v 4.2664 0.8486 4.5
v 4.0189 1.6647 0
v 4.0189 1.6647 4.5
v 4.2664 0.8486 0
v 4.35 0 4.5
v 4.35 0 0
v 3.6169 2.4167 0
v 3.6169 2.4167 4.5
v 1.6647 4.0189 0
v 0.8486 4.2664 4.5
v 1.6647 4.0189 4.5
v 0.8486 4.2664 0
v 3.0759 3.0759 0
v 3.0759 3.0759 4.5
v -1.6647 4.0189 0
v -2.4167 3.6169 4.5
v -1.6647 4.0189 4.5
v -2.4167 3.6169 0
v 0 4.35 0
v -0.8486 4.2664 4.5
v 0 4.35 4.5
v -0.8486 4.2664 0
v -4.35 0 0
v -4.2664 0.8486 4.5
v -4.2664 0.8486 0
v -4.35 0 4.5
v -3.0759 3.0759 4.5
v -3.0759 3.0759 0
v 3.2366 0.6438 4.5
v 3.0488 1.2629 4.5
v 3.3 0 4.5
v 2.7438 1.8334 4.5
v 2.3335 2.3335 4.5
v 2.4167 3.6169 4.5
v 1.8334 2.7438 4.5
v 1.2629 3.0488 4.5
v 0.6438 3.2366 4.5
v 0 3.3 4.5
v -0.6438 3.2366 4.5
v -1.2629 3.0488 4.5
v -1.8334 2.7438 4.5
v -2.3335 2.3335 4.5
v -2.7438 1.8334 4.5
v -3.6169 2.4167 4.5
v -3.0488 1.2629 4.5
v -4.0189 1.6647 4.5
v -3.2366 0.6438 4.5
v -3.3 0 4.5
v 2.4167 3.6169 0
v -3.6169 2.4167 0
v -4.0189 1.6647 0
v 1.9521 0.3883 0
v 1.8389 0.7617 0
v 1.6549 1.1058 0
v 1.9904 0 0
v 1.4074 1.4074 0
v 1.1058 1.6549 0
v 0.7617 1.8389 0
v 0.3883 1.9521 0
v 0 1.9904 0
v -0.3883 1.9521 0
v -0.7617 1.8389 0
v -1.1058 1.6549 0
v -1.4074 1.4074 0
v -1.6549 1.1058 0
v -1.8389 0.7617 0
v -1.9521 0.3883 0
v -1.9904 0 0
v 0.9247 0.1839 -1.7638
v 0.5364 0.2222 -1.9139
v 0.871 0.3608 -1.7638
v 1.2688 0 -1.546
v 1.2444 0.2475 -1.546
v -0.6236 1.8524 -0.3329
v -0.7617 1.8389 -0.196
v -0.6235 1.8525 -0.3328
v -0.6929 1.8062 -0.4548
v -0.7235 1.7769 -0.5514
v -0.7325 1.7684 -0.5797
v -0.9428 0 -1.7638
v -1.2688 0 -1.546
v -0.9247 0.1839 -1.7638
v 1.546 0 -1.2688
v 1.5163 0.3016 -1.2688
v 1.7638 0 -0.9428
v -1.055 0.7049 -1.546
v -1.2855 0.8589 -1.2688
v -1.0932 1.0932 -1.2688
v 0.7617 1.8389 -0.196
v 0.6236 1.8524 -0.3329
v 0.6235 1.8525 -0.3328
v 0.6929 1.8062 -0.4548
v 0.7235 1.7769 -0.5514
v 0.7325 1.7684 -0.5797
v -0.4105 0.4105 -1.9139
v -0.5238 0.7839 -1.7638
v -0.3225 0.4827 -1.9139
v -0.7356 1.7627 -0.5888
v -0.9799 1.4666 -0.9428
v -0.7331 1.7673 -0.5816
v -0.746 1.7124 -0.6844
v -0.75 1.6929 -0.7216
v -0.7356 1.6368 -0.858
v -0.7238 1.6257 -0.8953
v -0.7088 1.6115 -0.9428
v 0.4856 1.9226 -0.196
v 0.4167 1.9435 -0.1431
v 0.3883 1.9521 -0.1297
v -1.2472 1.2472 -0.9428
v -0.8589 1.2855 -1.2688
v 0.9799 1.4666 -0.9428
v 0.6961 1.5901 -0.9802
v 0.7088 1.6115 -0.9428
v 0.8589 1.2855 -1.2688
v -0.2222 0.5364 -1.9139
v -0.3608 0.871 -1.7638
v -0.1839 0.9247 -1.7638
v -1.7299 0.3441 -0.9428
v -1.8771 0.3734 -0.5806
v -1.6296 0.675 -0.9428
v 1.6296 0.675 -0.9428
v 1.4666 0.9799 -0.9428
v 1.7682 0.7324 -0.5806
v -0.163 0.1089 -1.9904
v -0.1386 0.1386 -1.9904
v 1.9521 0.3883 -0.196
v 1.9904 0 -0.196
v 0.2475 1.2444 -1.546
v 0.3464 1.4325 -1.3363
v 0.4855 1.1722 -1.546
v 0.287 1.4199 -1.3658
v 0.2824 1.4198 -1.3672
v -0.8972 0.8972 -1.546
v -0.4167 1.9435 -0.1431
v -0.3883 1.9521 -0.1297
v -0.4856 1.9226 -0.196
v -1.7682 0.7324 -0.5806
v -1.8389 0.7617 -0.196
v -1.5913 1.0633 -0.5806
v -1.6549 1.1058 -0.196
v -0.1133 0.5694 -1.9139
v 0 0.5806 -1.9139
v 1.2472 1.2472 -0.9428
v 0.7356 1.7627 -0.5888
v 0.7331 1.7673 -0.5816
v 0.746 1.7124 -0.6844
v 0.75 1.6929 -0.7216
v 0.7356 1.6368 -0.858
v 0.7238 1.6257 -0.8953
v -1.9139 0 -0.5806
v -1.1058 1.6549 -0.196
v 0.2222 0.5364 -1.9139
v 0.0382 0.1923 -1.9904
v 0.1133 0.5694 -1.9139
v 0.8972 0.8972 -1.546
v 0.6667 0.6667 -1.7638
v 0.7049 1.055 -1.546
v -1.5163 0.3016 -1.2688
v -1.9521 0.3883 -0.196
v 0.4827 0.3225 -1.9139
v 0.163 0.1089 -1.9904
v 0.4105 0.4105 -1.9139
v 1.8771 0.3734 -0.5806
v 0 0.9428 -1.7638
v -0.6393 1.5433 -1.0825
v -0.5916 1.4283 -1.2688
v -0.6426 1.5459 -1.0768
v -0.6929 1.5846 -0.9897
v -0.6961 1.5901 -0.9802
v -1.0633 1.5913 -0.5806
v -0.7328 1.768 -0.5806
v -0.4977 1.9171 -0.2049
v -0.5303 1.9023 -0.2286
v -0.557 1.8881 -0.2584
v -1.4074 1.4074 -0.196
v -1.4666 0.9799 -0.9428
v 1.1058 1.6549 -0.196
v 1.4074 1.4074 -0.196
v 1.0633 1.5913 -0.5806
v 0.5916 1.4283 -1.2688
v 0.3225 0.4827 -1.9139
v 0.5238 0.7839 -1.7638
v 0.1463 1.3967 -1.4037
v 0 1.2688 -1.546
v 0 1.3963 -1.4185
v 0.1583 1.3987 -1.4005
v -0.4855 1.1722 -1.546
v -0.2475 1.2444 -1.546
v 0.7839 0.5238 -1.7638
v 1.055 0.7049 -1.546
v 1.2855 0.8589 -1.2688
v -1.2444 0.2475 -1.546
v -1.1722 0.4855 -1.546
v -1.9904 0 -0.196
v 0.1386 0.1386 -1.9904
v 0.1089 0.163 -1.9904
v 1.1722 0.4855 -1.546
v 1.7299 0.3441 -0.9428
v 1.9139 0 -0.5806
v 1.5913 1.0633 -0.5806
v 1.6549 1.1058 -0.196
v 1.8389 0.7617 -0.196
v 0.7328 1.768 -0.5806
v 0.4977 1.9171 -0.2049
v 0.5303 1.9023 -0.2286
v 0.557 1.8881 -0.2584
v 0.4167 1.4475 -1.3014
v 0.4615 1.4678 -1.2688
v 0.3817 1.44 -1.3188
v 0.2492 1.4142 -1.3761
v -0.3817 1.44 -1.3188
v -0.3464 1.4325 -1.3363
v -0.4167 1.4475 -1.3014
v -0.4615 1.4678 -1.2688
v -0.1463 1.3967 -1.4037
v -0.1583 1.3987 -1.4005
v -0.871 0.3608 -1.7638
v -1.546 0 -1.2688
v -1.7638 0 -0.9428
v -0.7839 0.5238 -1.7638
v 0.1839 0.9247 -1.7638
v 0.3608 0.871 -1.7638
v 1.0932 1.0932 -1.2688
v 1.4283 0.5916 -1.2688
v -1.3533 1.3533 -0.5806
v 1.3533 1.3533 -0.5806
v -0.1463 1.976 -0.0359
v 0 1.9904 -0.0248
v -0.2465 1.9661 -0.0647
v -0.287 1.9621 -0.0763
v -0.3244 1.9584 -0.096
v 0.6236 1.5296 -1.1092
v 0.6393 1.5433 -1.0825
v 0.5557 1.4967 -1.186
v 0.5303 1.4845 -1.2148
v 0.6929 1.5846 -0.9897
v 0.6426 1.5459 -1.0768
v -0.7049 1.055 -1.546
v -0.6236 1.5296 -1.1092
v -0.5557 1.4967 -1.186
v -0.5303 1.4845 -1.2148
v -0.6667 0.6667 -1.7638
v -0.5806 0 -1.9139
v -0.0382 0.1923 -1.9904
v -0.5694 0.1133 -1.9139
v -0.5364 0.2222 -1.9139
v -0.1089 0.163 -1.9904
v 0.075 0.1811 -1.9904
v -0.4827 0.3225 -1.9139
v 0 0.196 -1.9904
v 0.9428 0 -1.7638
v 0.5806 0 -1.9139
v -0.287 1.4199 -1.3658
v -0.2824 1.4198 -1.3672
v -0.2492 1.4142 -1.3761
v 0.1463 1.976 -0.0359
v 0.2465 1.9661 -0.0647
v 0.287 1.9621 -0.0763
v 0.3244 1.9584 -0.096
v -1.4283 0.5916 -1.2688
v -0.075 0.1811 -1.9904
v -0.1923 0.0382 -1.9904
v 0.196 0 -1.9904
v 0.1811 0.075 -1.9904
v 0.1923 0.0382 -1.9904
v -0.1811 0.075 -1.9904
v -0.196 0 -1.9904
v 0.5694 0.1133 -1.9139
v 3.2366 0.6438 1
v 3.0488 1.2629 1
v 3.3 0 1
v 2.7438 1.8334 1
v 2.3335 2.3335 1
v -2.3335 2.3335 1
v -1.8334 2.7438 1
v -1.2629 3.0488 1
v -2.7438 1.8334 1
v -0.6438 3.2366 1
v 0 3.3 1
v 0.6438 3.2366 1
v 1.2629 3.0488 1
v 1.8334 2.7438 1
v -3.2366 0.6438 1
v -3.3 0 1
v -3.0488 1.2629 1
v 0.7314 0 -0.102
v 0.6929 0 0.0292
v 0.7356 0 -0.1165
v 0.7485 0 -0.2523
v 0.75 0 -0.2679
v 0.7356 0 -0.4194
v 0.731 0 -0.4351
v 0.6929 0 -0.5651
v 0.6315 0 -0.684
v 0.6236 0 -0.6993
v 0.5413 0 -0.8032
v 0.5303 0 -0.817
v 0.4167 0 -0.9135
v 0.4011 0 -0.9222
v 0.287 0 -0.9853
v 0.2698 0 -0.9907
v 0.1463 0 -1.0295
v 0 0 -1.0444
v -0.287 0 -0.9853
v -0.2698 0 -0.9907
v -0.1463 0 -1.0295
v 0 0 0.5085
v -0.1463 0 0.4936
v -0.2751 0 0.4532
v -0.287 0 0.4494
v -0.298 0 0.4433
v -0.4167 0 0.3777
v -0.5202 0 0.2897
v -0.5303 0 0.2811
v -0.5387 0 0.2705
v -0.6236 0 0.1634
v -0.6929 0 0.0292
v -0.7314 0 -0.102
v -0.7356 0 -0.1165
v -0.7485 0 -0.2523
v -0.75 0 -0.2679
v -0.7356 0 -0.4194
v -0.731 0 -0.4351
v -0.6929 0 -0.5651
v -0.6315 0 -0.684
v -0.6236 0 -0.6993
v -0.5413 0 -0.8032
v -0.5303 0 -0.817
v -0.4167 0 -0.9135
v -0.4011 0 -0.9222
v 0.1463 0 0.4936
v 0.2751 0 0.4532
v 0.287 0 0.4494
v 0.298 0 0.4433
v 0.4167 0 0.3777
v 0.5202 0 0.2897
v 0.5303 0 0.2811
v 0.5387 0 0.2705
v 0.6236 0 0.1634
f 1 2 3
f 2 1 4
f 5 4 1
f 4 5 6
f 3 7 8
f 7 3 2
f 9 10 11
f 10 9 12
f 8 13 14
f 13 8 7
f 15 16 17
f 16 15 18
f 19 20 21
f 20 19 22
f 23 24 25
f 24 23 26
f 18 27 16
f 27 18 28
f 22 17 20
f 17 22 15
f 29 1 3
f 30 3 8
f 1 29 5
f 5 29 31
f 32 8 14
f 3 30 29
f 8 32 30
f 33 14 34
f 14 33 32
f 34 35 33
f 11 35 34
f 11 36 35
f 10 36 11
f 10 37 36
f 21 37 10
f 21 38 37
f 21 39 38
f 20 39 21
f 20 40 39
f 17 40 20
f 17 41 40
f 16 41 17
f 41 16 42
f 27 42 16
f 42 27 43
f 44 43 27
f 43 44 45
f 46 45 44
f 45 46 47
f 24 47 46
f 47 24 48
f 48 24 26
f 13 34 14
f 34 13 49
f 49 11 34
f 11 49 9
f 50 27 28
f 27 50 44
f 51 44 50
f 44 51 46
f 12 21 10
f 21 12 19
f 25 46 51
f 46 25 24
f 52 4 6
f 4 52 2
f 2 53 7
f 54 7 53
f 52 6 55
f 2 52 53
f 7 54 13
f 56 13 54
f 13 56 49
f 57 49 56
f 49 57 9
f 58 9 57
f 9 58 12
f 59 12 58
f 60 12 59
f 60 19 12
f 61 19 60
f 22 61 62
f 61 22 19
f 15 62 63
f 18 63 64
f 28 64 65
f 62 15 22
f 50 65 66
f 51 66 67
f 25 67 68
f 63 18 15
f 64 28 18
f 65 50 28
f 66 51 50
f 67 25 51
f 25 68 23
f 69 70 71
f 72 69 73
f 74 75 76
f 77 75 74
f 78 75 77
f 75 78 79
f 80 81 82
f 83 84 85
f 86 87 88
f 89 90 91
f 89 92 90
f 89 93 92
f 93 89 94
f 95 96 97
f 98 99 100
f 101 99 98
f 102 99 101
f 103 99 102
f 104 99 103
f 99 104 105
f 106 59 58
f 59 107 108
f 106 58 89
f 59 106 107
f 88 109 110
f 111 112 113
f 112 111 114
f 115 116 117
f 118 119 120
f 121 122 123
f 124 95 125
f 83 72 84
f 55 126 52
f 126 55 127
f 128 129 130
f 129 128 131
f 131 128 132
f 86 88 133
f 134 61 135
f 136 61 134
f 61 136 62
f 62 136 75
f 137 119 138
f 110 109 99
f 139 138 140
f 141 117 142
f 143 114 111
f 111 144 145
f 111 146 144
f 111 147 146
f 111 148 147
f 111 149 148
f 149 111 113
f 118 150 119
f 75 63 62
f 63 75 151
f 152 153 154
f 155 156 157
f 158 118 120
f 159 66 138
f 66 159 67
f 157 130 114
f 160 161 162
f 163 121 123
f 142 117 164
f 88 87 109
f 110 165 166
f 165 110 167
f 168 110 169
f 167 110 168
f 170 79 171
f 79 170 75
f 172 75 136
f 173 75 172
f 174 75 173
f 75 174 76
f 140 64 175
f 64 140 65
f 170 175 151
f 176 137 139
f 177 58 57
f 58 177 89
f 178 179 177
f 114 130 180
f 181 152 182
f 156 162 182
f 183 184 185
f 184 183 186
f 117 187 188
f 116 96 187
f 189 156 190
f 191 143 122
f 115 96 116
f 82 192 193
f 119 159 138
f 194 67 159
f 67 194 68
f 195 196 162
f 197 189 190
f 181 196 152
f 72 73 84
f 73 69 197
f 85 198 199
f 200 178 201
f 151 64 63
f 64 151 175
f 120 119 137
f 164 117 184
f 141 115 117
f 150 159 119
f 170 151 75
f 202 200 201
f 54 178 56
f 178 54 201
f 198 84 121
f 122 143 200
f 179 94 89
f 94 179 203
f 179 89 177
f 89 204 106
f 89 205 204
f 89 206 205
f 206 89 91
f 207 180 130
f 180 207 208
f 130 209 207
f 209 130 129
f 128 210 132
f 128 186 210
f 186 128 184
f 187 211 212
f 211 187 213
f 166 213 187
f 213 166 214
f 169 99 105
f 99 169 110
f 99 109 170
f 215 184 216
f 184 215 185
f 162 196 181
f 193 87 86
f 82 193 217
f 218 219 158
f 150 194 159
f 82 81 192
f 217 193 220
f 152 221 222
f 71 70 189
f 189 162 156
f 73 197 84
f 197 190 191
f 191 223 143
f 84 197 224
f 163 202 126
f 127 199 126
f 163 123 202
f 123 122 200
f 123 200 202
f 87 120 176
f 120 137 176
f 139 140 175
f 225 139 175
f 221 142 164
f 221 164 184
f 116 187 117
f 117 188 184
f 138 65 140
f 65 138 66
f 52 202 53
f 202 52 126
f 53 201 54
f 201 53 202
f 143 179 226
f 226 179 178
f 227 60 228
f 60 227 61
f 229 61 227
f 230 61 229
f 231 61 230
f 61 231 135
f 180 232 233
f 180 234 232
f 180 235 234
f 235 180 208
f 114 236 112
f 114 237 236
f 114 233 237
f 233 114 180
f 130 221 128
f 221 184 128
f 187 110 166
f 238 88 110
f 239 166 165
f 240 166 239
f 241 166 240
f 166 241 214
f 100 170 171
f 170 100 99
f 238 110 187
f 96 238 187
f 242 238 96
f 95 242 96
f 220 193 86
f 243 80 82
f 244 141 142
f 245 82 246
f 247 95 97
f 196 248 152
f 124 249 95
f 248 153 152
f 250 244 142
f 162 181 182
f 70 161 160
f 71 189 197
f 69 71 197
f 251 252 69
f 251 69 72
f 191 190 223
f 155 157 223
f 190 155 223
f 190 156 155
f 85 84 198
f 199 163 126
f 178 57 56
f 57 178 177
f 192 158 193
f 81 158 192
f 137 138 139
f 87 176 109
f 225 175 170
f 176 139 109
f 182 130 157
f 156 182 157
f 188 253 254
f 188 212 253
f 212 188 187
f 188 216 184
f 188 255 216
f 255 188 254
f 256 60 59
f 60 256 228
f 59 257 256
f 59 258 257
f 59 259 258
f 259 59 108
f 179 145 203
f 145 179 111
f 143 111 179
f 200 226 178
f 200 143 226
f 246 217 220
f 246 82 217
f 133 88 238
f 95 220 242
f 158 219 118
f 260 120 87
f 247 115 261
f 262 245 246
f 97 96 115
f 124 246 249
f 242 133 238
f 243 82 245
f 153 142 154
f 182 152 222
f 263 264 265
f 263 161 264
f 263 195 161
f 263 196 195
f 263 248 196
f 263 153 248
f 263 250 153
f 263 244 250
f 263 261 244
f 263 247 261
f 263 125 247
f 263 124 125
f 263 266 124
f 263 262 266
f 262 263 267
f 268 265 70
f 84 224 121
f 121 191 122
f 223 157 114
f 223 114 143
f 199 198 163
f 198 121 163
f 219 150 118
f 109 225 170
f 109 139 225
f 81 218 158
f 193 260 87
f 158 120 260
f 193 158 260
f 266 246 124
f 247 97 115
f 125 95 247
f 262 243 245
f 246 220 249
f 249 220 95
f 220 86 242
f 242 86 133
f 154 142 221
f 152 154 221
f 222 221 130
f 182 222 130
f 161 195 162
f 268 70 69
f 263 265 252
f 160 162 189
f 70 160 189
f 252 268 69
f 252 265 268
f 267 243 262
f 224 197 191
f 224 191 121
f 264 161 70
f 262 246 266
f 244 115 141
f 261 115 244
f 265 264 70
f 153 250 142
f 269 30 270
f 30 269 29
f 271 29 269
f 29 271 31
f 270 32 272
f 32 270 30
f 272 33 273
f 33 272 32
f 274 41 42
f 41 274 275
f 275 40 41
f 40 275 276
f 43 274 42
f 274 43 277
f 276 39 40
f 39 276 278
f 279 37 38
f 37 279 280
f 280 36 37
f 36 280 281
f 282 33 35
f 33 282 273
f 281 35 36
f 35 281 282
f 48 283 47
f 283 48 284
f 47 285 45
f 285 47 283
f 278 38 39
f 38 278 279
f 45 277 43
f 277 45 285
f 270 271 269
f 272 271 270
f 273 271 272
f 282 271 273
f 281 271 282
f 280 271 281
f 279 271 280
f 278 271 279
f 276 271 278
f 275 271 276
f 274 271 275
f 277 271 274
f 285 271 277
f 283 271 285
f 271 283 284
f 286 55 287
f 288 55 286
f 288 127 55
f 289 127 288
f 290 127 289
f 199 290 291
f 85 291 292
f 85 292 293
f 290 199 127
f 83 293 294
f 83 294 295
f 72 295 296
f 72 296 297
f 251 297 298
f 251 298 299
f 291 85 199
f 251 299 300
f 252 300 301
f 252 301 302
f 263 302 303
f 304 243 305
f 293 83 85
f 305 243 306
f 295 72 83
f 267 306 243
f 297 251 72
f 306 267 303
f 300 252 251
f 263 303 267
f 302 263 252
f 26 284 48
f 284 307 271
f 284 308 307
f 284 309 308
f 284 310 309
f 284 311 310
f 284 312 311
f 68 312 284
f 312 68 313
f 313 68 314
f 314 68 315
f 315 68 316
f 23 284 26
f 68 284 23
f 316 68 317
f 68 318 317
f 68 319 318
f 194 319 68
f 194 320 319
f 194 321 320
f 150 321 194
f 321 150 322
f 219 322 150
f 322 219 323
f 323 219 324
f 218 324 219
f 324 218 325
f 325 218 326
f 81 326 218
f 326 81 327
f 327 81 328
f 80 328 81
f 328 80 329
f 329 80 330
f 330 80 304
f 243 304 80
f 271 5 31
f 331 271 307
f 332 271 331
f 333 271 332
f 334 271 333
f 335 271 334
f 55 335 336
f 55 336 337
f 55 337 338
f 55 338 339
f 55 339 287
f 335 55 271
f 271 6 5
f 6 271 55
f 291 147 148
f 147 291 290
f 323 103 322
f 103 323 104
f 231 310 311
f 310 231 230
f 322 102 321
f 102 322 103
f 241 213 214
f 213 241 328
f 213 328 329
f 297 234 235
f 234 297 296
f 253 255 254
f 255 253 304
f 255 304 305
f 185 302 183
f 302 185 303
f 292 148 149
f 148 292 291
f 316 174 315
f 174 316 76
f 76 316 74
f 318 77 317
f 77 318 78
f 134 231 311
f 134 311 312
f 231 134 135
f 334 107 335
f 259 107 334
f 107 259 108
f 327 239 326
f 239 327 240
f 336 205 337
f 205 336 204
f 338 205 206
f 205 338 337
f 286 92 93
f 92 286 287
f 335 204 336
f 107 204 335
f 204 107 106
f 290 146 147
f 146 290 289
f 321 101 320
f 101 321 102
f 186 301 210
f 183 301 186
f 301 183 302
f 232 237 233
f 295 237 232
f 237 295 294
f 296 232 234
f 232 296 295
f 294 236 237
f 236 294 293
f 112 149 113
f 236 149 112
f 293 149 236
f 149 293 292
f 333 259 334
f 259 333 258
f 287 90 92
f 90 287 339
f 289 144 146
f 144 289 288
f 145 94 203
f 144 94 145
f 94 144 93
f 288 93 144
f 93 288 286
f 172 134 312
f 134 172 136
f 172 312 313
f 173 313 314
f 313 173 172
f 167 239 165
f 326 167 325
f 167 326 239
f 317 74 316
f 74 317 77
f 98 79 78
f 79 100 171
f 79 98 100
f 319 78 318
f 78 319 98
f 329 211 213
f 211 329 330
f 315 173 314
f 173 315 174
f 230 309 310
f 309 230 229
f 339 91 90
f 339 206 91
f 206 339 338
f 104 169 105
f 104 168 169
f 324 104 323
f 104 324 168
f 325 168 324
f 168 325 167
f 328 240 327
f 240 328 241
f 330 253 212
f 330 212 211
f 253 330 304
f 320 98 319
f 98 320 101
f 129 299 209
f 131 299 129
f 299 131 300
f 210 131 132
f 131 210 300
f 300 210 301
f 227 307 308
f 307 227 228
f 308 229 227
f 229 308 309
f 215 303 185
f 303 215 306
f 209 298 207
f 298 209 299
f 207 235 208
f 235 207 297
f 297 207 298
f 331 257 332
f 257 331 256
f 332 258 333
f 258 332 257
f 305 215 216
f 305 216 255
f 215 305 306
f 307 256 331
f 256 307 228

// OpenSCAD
$fn=32;
difference() {
  union() {
    cylinder(r=4.35,h=4.5);
    sphere(r=2);
  }
  translate([0,0,1]) cylinder(r=3.3,h=3.6);
  translate([-50,-100,-5]) cube([100,100,100]);
  translate([0,-1,0]) rotate([-105,0,0]) cylinder(r=0.75,h=10);
  //translate([0,0,0]) sphere(r=1.5);
 // translate([0,0,0.5]) cylinder(r=1.5,h=10);
}
